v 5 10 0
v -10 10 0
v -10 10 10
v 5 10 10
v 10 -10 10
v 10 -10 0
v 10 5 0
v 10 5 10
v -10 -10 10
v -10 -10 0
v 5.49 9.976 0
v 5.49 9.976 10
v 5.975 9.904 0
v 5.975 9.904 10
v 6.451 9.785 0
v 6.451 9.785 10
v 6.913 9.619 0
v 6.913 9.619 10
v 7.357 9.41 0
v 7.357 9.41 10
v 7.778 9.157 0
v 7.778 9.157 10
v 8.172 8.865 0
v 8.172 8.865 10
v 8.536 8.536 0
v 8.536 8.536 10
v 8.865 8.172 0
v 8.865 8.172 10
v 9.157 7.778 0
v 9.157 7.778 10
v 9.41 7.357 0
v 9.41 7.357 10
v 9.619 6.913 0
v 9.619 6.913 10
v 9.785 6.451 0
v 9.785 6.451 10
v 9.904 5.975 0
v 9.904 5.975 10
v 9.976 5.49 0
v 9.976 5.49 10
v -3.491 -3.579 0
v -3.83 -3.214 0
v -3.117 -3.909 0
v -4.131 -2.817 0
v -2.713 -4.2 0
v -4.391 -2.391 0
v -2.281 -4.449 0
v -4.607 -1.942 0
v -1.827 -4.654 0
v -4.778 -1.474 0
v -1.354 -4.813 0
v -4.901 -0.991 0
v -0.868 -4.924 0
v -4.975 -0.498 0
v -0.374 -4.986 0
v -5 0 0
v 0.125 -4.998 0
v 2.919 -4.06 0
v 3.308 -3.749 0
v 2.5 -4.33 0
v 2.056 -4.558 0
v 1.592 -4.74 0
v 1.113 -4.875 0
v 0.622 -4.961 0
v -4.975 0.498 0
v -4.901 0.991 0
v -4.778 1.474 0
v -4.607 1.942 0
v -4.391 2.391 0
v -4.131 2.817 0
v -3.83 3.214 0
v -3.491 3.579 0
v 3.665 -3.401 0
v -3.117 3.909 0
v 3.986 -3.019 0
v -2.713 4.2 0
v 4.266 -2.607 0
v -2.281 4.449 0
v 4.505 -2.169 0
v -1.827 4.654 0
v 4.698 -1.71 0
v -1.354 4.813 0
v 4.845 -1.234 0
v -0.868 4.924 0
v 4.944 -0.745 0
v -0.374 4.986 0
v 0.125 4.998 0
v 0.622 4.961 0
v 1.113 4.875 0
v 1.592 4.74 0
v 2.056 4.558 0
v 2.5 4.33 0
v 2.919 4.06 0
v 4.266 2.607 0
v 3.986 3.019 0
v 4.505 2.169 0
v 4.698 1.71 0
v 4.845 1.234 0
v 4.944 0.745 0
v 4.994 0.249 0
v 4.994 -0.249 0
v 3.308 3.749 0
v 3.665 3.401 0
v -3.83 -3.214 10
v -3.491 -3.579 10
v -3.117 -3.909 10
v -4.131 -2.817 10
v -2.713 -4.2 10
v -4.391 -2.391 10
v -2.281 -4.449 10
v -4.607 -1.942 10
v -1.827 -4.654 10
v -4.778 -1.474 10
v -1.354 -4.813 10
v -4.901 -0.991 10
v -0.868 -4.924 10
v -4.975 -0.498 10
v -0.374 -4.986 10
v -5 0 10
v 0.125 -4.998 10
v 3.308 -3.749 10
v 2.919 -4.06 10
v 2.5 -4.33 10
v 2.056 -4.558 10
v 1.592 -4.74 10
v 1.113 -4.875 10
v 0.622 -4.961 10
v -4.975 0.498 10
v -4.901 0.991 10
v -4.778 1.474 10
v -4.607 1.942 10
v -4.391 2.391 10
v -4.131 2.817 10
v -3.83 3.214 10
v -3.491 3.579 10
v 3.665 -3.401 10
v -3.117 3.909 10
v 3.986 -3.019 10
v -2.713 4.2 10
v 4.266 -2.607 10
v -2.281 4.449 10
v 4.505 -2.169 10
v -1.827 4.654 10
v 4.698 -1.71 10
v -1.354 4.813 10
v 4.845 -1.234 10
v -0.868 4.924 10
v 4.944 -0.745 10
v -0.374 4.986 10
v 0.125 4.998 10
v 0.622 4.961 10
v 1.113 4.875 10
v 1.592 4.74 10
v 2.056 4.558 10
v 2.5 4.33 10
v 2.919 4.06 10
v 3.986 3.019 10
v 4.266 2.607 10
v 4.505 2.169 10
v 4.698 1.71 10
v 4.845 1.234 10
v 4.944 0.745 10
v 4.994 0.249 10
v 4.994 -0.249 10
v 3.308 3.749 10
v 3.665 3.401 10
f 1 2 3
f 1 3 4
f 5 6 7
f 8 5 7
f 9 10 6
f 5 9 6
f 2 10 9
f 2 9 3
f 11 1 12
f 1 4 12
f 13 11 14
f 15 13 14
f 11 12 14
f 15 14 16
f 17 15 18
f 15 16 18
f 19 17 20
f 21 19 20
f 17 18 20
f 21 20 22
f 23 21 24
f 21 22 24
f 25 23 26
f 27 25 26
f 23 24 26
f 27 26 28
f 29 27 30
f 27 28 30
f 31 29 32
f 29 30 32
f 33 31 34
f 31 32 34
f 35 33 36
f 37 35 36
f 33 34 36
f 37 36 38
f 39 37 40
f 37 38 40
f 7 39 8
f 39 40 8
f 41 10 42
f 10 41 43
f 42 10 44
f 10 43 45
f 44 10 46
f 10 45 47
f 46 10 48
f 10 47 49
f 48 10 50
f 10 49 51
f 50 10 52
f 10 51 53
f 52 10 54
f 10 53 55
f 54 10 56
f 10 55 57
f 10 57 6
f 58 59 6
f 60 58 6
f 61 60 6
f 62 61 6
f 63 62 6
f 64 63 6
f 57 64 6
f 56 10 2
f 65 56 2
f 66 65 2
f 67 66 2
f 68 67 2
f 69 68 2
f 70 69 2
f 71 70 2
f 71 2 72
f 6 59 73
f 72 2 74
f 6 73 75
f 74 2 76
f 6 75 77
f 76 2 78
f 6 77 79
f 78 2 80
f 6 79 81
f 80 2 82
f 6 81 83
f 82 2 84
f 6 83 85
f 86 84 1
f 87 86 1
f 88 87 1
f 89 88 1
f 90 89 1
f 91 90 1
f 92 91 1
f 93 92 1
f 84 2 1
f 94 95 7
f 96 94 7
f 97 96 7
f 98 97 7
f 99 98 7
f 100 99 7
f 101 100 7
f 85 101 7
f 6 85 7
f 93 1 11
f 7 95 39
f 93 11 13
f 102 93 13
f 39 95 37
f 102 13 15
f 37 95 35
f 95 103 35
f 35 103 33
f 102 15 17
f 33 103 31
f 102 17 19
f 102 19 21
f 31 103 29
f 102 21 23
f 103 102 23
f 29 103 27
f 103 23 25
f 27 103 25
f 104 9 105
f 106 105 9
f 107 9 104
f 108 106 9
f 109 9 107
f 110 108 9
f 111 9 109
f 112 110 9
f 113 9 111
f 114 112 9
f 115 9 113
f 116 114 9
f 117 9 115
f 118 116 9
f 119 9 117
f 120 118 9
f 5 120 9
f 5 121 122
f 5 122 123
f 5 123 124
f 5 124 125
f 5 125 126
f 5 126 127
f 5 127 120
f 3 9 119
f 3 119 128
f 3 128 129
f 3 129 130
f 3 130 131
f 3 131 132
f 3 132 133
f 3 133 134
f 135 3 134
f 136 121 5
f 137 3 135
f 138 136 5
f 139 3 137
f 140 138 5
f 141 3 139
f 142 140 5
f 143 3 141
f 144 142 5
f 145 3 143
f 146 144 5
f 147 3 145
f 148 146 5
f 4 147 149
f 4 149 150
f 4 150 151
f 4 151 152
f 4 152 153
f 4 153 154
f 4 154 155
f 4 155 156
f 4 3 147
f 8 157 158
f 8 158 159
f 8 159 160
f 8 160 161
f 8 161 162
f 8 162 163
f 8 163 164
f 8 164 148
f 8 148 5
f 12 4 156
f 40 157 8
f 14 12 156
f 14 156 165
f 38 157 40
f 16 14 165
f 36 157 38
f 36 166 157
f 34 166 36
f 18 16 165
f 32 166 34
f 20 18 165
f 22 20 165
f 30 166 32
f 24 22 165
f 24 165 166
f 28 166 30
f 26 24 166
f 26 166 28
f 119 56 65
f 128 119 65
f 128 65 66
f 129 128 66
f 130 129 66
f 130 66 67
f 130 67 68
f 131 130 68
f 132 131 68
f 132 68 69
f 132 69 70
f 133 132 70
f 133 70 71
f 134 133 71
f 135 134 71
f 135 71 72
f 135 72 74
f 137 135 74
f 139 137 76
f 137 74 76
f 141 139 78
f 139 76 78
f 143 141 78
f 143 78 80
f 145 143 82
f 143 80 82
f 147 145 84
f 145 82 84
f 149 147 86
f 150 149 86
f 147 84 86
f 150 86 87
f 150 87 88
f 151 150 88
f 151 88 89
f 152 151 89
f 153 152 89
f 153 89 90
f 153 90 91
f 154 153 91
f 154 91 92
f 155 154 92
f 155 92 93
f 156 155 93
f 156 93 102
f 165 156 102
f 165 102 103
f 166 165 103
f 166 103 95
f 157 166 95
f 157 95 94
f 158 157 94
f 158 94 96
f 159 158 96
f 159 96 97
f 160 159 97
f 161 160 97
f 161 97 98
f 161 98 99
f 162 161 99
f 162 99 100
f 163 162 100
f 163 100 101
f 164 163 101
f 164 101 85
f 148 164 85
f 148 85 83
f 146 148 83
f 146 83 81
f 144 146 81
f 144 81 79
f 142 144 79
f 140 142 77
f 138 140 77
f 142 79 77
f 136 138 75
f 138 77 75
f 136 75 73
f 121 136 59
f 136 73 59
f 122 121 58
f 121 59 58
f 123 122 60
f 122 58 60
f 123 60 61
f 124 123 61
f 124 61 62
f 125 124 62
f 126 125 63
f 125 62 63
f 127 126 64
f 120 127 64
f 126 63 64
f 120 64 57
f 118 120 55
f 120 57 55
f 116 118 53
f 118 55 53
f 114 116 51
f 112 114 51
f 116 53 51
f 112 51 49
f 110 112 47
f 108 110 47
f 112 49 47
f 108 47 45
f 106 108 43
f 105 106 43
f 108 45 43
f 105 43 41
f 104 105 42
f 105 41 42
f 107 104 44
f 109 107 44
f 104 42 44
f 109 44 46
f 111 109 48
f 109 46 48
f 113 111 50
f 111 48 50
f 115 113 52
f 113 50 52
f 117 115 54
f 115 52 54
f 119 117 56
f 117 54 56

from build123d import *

# Parameters (mm, degrees)
F0_W     = 20
F0_H     = 20
F1_DEPTH = 10
F3_D     = 10
F4_R     = 5


with BuildPart() as f1:
    # F0 (on Top) → F1 (new body)
    with BuildSketch(Plane.XY):
        Rectangle(F0_W, F0_H)
    extrude(amount=F1_DEPTH)

    # F3 (through all)
    with Locations(Plane.XY.offset(10)):
        with Locations((0, 0)):
            Hole(F3_D / 2)

    # F4
    f4_edges = [f1.edges().sort_by_distance(p)[0] for p in [
        (10, 10, 5),
    ]]
    fillet(f4_edges, radius=F4_R)


solid = f1.part
